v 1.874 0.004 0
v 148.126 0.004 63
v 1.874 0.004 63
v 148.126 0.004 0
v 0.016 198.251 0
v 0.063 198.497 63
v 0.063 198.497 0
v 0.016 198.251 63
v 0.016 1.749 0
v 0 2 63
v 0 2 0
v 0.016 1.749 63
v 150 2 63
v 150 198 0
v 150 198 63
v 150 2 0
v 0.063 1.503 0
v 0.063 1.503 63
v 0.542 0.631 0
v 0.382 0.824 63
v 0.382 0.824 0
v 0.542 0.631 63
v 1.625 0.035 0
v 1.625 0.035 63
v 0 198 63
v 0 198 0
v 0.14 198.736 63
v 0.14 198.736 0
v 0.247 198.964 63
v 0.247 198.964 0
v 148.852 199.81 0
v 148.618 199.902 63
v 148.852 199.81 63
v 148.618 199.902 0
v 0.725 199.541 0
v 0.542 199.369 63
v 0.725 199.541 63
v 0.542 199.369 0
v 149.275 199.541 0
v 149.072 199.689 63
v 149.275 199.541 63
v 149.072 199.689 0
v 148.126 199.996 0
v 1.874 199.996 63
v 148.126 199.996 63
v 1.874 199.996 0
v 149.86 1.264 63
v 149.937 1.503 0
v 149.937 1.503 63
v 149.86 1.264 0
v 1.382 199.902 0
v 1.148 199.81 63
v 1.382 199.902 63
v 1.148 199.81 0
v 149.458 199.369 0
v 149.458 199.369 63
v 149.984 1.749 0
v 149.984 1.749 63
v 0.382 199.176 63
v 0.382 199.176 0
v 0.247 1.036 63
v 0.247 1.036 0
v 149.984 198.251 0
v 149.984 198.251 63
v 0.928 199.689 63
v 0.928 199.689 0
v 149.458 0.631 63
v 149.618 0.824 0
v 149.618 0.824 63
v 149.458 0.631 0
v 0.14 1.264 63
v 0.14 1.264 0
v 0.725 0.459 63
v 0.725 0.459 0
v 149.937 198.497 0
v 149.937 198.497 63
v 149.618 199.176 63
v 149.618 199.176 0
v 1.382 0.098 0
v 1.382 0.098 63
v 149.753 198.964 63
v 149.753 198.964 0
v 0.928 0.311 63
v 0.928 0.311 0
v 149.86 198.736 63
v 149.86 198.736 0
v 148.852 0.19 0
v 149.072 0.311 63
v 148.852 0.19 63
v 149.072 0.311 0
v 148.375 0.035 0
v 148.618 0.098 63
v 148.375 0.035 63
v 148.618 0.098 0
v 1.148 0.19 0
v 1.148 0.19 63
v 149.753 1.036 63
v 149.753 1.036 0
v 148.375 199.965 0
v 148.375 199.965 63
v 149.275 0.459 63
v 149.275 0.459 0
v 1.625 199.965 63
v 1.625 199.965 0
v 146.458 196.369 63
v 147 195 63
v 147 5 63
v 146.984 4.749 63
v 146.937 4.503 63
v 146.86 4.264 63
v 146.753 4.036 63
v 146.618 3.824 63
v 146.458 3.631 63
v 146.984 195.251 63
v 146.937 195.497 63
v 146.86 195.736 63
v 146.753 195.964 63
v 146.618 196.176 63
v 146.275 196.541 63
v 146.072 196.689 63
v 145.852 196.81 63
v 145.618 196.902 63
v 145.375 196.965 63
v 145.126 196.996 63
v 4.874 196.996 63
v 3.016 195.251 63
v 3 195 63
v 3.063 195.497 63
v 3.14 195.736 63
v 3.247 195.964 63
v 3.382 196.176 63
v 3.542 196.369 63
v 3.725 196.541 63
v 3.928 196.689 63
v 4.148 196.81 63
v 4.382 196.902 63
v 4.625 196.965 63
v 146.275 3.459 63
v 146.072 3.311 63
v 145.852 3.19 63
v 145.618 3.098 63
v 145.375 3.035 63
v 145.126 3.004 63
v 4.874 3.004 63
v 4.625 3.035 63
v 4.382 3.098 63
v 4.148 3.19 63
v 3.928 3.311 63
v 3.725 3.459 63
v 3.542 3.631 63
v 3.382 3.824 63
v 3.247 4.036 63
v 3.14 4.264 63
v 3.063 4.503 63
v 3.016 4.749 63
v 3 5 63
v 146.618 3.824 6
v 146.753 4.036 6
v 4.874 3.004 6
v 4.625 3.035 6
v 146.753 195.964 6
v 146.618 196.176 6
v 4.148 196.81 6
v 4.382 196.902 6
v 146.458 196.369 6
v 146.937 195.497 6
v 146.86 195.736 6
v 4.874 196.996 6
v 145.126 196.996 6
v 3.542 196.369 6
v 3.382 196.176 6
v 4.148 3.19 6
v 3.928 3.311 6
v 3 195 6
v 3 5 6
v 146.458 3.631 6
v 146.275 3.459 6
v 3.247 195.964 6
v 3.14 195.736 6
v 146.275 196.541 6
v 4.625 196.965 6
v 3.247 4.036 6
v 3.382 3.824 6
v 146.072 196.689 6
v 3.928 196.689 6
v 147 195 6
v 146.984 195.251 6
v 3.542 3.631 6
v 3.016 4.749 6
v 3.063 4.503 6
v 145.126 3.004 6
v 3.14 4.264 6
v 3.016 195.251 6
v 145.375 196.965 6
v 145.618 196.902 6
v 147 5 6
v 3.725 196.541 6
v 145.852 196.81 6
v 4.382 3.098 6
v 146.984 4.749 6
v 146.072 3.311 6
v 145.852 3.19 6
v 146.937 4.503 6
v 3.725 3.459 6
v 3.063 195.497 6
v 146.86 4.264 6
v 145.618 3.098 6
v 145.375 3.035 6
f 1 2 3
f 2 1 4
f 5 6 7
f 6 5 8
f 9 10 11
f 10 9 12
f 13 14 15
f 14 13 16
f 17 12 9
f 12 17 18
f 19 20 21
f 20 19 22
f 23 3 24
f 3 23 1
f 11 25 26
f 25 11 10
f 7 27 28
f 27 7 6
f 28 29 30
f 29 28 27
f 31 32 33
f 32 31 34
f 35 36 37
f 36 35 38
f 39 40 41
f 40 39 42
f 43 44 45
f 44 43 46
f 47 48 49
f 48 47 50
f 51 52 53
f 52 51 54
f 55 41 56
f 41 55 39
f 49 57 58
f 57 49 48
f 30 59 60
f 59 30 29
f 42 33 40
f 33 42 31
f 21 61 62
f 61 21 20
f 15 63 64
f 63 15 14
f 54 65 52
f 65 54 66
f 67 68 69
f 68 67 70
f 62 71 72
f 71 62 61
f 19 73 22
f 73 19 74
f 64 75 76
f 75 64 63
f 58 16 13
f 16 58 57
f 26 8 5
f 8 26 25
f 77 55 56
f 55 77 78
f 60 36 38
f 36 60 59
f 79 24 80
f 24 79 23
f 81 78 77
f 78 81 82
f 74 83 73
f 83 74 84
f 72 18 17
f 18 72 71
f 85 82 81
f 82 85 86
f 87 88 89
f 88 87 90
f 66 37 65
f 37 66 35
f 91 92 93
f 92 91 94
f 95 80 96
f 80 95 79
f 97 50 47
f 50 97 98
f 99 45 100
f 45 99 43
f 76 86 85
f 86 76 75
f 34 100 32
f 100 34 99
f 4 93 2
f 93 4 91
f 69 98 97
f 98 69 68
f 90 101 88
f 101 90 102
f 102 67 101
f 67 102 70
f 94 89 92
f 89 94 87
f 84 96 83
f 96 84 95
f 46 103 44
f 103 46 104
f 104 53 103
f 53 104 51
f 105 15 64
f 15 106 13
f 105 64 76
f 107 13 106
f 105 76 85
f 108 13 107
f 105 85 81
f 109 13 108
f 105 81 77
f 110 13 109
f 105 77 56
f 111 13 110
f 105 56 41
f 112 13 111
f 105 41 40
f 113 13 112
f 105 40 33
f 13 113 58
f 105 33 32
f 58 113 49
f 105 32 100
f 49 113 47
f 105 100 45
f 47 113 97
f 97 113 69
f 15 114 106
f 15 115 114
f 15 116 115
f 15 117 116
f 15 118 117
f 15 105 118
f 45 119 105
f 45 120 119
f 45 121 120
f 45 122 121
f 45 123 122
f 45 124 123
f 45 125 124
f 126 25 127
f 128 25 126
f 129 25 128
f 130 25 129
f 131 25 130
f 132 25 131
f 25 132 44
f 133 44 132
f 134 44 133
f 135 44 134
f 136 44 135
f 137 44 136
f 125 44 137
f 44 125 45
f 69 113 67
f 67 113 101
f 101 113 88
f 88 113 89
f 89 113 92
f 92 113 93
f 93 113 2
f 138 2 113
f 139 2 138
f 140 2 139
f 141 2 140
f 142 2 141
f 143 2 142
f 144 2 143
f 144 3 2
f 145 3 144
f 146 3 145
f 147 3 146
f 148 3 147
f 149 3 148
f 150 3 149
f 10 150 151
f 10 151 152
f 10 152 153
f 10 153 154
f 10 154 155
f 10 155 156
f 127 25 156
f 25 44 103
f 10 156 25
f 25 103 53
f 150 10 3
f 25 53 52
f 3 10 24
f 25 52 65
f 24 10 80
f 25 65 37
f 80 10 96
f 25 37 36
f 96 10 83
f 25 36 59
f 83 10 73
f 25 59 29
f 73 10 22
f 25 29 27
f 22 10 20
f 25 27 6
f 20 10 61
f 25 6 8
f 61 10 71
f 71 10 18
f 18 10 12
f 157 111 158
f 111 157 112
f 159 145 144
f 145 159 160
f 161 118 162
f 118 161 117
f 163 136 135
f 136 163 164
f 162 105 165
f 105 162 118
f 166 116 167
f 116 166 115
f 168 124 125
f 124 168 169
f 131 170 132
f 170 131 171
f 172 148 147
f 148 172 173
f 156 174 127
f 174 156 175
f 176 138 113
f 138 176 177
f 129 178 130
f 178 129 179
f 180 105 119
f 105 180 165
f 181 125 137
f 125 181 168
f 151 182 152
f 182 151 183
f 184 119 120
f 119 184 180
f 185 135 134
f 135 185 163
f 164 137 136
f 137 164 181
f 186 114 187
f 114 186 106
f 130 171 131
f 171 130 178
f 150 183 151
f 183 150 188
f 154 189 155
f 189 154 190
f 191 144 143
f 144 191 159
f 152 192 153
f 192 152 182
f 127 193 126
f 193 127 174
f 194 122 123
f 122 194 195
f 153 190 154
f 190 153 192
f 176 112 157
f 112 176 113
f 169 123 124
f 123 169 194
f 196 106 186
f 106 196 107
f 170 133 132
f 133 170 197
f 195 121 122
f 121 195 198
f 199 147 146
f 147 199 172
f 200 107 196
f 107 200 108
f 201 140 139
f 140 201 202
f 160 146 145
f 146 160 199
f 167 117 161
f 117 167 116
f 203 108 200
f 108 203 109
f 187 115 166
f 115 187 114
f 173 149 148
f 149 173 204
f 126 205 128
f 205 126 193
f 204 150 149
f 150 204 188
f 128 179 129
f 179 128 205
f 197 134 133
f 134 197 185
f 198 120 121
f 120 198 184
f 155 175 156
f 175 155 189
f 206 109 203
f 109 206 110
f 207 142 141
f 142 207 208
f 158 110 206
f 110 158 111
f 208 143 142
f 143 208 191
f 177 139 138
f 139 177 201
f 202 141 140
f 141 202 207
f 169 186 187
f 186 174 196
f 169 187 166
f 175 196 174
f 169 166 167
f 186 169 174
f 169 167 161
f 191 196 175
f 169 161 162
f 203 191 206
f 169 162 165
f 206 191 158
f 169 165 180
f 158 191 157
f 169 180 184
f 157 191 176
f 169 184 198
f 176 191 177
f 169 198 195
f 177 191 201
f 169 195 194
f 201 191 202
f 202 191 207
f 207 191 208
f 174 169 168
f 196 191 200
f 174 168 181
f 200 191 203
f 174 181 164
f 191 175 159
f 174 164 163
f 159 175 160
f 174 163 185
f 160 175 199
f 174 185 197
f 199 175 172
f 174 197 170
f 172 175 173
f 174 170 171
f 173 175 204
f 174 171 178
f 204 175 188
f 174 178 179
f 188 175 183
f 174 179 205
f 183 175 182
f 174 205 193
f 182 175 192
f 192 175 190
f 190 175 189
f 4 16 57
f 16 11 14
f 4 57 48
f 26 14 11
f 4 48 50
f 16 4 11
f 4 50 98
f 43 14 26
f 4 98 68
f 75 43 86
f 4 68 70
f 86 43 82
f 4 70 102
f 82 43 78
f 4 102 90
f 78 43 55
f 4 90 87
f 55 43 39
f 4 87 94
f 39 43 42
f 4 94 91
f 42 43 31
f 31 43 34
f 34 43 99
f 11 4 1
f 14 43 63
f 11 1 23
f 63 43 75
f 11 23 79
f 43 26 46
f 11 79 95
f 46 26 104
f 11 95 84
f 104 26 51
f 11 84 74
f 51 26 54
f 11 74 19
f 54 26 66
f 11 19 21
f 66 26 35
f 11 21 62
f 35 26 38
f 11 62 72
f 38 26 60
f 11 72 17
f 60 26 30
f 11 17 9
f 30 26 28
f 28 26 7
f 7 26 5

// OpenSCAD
width = 150;
depth = 200;
bottom_thickness = 3;
wall_height = 30;
wall_thickness = 3;
roundness = 2;
cgal_border = 1;    // A border to fix cgal rendering bugs.

$fn=50;

echo("Rendering enclosure.");

// Bottom plate
translate([roundness, roundness,0]) {
  minkowski() {
    cube([width-(2*roundness), depth-(2*roundness), bottom_thickness]);
    cylinder(r=roundness, bottom_thickness);
  }
}

// Wall
translate([roundness, roundness, bottom_thickness]) {
  difference() {
    // outer wall
    minkowski() {
      cube([width-(2*roundness), depth-(2*roundness), wall_height]);
      cylinder(r=roundness, wall_height);
    }
    // inner wall
    translate([wall_thickness, wall_thickness, 0]) {
      minkowski() {
        cube([width-(2*roundness)-(2*wall_thickness)
            , depth-(2*roundness)-(2*wall_thickness)
            , wall_height+cgal_border]);
        cylinder(r=roundness, wall_height+cgal_border);
      }
    }
    // Lueftungsschlitze

  }
}
